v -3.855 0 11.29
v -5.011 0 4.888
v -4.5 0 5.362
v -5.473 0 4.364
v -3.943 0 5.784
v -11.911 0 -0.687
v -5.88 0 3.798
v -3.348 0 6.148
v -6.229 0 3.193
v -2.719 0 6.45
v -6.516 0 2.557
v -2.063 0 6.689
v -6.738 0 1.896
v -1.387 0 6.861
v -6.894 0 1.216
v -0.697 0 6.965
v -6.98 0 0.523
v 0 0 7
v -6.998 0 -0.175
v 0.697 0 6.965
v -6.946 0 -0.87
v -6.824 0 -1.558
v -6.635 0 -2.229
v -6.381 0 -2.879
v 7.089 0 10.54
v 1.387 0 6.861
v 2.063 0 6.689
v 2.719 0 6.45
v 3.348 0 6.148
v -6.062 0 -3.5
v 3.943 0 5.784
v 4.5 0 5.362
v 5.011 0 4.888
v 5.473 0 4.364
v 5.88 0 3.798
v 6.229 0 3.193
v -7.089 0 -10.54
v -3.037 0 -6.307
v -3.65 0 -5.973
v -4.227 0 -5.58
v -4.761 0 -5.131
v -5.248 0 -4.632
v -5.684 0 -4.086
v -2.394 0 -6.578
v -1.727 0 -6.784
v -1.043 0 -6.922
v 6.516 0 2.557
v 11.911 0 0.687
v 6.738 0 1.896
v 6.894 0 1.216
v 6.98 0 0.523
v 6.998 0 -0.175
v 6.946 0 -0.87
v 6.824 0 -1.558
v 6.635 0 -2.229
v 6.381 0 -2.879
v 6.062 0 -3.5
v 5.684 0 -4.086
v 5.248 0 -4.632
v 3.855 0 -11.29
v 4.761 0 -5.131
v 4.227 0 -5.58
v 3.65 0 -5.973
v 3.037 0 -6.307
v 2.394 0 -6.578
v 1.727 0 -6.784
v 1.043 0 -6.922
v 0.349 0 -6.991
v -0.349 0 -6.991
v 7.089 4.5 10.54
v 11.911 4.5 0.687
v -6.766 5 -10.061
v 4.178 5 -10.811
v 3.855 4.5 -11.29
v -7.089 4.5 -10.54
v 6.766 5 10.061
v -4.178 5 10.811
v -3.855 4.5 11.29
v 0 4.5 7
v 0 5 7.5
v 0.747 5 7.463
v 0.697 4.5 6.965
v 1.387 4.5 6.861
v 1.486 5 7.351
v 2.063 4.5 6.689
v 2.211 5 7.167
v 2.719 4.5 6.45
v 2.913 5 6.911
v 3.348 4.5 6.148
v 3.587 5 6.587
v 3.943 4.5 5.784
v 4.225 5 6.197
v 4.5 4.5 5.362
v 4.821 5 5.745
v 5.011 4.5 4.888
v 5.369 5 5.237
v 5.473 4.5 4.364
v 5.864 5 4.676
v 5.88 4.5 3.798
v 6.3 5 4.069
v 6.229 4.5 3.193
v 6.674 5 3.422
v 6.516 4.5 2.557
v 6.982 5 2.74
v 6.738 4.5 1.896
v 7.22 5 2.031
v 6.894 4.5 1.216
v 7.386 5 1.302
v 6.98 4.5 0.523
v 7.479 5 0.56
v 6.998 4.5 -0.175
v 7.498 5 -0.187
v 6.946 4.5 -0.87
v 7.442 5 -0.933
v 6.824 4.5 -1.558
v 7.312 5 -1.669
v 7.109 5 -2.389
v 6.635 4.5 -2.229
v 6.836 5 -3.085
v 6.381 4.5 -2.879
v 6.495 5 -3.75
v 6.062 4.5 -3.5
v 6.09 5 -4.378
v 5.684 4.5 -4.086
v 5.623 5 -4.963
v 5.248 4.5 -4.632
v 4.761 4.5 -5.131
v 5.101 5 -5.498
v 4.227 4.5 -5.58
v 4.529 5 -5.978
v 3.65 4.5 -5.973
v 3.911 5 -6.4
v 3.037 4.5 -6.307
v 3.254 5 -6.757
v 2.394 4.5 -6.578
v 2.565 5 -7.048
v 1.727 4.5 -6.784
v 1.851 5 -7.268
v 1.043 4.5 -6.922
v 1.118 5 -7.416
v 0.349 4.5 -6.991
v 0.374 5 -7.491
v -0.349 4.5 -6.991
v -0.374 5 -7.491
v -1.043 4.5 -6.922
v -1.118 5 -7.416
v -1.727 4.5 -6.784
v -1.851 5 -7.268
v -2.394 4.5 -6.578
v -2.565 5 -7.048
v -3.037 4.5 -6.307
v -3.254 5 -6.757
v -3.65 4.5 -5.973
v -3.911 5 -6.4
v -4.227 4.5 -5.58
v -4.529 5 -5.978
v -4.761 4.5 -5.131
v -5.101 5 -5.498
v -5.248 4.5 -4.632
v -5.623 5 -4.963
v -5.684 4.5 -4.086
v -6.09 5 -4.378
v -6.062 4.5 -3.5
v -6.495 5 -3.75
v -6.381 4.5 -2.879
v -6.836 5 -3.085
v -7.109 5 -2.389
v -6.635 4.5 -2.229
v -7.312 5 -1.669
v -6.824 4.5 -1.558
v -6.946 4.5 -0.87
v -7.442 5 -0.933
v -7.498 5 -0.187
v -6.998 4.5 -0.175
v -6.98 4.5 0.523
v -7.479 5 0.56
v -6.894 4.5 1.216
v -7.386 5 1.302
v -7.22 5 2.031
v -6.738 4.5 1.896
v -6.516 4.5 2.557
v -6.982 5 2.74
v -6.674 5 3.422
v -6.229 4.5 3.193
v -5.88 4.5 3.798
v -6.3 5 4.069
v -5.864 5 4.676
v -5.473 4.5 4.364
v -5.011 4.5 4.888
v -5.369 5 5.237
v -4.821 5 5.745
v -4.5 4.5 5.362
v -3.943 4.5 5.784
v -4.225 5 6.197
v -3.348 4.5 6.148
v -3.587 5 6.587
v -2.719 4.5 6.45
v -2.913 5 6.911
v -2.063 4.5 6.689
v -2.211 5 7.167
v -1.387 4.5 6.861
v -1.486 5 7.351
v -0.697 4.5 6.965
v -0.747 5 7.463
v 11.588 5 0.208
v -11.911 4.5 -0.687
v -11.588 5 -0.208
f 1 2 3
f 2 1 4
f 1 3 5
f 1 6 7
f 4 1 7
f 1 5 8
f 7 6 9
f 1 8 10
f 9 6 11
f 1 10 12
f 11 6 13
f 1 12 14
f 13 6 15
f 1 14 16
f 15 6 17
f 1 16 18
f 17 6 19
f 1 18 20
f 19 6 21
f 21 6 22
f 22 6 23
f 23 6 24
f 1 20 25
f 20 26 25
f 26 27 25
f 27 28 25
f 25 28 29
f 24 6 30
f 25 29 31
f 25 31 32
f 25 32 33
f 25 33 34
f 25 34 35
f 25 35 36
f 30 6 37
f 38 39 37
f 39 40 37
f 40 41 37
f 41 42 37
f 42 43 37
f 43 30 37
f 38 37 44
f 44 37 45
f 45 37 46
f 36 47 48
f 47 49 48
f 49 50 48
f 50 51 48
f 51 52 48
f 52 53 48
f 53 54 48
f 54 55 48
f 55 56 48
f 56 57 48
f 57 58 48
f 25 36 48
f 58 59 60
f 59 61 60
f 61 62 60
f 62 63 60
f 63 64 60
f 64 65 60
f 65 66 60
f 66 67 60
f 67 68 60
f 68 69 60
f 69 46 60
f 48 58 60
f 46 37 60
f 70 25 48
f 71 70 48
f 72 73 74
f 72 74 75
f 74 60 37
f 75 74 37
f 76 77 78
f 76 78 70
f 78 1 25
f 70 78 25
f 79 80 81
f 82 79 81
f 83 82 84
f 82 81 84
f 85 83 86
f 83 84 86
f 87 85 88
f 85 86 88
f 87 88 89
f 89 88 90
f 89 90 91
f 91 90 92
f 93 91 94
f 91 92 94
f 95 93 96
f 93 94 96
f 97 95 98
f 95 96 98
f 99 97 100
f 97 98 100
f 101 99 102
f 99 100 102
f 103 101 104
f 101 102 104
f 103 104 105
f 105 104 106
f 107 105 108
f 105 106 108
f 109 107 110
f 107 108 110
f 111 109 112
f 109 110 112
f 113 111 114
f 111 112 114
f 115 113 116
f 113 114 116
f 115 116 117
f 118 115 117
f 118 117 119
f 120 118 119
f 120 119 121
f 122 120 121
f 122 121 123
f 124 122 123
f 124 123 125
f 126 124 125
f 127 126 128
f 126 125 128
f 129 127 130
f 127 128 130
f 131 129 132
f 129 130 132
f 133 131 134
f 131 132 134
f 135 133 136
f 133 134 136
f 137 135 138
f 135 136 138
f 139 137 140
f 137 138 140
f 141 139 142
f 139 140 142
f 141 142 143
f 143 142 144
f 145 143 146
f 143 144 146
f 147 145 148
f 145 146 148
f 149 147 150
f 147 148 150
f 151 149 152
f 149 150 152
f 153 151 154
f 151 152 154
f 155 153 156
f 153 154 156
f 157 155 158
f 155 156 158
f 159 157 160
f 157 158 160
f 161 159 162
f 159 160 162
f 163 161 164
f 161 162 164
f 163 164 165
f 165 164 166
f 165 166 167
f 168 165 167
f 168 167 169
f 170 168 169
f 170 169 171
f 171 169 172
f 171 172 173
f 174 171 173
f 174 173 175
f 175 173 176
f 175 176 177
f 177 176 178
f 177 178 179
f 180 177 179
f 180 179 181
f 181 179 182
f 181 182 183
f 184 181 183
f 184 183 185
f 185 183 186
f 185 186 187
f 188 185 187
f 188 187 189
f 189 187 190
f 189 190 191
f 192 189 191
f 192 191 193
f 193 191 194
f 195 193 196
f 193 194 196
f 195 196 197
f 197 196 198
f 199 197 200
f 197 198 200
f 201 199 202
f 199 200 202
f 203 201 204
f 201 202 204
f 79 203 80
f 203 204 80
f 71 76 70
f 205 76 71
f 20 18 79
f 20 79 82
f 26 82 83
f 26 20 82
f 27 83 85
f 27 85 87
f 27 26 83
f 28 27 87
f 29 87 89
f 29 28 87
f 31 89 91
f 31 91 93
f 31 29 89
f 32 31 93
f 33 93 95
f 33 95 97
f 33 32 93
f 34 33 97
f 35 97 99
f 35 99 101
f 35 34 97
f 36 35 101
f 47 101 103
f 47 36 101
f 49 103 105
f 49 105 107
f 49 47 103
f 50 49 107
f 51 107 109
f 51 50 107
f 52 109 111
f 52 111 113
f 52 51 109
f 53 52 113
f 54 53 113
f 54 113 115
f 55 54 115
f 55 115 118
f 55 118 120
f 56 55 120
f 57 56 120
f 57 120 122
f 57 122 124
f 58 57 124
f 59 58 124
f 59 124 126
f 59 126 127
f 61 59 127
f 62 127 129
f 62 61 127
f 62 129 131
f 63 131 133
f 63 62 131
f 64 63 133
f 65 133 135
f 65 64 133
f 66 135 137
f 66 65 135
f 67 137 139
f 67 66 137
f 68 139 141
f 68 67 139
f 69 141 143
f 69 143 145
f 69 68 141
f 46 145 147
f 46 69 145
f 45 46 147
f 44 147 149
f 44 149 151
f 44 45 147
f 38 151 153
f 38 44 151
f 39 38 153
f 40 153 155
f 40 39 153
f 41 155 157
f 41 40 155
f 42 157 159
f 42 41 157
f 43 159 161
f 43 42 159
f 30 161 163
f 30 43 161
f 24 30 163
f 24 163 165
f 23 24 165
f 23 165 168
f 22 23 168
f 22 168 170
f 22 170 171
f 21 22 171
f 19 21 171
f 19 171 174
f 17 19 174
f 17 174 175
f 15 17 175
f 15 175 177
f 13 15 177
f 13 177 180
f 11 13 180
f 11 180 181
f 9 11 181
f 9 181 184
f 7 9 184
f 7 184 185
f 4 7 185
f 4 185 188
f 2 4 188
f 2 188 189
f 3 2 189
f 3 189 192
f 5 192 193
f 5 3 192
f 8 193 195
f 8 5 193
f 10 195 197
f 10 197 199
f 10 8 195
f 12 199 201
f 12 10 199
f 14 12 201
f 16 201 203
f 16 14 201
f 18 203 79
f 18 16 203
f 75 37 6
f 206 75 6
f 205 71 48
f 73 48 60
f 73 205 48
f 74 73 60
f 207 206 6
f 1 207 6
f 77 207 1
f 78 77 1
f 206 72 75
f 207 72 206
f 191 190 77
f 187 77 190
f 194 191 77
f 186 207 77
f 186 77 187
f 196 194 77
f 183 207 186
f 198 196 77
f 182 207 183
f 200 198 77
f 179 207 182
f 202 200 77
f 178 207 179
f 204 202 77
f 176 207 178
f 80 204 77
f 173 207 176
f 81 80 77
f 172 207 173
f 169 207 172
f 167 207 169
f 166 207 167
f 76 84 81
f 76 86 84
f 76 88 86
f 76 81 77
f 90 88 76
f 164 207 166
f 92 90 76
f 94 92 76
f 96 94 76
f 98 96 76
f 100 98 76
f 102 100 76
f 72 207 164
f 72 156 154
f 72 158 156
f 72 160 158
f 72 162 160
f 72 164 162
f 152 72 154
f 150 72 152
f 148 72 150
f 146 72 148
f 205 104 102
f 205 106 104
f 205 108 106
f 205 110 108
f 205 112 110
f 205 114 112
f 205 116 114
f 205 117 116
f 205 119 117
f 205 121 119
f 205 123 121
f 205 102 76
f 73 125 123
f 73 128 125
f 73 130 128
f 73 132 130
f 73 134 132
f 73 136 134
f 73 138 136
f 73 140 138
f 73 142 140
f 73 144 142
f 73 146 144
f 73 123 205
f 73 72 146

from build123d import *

# Parameters (mm, degrees)
SKETCH1_R           = 7
BOSS_EXTRUDE1_DEPTH = 5
CHAMFER1_SIZE       = 0.5
CUT_EXTRUDE1_DEPTH  = 18.76901793


with BuildPart() as part:
    # Sketch1 → Boss-Extrude1 (new body)
    with BuildSketch(Plane(origin=(0, 0, 0), x_dir=(1, 0, 0), z_dir=(0, 1, 0))):
        Polygon((7.08862867, -10.539671575), (12.671937667, 0.869096719), (5.583308997, 11.408768294), (-7.08862867, 10.539671575), (-12.671937667, -0.869096719), (-5.583308997, -11.408768294), align=None)
        with Locations(Location((0, 0, 0), (0, 0, 270))):
            Circle(SKETCH1_R, mode=Mode.SUBTRACT)
    extrude(amount=BOSS_EXTRUDE1_DEPTH)

    # Chamfer1
    chamfer1_edges = [part.edges().sort_by_distance(p)[0] for p in [
        (9.127623332, 5, -6.138932506),
        (-0.752659837, 5, -10.974219934),
        (-9.880283168, 5, -4.835287428),
        (0, 5, -7),
        (-9.127623332, 5, 6.138932506),
        (0.752659837, 5, 10.974219934),
        (9.880283168, 5, 4.835287428),
    ]]
    chamfer(chamfer1_edges, length=CHAMFER1_SIZE)

    # Sketch2 → Cut-Extrude1 (cut, through all)
    with BuildSketch(Plane(origin=(0, 5, 0), x_dir=(1, 0, 0), z_dir=(0, 1, 0))):
        Polygon((-12.369841003, 1.369496951), (-3.313446114, -12.095932292), (-6.221668225, -14.051904686), (-15.278063114, -0.586475443), align=None)
        Polygon((3.396053842, 11.973107643), (6.304275954, 13.929080037), (15.360670843, 0.463650794), (12.452448732, -1.4923216), align=None)
    extrude(amount=-CUT_EXTRUDE1_DEPTH, mode=Mode.SUBTRACT)


solid = part.part
